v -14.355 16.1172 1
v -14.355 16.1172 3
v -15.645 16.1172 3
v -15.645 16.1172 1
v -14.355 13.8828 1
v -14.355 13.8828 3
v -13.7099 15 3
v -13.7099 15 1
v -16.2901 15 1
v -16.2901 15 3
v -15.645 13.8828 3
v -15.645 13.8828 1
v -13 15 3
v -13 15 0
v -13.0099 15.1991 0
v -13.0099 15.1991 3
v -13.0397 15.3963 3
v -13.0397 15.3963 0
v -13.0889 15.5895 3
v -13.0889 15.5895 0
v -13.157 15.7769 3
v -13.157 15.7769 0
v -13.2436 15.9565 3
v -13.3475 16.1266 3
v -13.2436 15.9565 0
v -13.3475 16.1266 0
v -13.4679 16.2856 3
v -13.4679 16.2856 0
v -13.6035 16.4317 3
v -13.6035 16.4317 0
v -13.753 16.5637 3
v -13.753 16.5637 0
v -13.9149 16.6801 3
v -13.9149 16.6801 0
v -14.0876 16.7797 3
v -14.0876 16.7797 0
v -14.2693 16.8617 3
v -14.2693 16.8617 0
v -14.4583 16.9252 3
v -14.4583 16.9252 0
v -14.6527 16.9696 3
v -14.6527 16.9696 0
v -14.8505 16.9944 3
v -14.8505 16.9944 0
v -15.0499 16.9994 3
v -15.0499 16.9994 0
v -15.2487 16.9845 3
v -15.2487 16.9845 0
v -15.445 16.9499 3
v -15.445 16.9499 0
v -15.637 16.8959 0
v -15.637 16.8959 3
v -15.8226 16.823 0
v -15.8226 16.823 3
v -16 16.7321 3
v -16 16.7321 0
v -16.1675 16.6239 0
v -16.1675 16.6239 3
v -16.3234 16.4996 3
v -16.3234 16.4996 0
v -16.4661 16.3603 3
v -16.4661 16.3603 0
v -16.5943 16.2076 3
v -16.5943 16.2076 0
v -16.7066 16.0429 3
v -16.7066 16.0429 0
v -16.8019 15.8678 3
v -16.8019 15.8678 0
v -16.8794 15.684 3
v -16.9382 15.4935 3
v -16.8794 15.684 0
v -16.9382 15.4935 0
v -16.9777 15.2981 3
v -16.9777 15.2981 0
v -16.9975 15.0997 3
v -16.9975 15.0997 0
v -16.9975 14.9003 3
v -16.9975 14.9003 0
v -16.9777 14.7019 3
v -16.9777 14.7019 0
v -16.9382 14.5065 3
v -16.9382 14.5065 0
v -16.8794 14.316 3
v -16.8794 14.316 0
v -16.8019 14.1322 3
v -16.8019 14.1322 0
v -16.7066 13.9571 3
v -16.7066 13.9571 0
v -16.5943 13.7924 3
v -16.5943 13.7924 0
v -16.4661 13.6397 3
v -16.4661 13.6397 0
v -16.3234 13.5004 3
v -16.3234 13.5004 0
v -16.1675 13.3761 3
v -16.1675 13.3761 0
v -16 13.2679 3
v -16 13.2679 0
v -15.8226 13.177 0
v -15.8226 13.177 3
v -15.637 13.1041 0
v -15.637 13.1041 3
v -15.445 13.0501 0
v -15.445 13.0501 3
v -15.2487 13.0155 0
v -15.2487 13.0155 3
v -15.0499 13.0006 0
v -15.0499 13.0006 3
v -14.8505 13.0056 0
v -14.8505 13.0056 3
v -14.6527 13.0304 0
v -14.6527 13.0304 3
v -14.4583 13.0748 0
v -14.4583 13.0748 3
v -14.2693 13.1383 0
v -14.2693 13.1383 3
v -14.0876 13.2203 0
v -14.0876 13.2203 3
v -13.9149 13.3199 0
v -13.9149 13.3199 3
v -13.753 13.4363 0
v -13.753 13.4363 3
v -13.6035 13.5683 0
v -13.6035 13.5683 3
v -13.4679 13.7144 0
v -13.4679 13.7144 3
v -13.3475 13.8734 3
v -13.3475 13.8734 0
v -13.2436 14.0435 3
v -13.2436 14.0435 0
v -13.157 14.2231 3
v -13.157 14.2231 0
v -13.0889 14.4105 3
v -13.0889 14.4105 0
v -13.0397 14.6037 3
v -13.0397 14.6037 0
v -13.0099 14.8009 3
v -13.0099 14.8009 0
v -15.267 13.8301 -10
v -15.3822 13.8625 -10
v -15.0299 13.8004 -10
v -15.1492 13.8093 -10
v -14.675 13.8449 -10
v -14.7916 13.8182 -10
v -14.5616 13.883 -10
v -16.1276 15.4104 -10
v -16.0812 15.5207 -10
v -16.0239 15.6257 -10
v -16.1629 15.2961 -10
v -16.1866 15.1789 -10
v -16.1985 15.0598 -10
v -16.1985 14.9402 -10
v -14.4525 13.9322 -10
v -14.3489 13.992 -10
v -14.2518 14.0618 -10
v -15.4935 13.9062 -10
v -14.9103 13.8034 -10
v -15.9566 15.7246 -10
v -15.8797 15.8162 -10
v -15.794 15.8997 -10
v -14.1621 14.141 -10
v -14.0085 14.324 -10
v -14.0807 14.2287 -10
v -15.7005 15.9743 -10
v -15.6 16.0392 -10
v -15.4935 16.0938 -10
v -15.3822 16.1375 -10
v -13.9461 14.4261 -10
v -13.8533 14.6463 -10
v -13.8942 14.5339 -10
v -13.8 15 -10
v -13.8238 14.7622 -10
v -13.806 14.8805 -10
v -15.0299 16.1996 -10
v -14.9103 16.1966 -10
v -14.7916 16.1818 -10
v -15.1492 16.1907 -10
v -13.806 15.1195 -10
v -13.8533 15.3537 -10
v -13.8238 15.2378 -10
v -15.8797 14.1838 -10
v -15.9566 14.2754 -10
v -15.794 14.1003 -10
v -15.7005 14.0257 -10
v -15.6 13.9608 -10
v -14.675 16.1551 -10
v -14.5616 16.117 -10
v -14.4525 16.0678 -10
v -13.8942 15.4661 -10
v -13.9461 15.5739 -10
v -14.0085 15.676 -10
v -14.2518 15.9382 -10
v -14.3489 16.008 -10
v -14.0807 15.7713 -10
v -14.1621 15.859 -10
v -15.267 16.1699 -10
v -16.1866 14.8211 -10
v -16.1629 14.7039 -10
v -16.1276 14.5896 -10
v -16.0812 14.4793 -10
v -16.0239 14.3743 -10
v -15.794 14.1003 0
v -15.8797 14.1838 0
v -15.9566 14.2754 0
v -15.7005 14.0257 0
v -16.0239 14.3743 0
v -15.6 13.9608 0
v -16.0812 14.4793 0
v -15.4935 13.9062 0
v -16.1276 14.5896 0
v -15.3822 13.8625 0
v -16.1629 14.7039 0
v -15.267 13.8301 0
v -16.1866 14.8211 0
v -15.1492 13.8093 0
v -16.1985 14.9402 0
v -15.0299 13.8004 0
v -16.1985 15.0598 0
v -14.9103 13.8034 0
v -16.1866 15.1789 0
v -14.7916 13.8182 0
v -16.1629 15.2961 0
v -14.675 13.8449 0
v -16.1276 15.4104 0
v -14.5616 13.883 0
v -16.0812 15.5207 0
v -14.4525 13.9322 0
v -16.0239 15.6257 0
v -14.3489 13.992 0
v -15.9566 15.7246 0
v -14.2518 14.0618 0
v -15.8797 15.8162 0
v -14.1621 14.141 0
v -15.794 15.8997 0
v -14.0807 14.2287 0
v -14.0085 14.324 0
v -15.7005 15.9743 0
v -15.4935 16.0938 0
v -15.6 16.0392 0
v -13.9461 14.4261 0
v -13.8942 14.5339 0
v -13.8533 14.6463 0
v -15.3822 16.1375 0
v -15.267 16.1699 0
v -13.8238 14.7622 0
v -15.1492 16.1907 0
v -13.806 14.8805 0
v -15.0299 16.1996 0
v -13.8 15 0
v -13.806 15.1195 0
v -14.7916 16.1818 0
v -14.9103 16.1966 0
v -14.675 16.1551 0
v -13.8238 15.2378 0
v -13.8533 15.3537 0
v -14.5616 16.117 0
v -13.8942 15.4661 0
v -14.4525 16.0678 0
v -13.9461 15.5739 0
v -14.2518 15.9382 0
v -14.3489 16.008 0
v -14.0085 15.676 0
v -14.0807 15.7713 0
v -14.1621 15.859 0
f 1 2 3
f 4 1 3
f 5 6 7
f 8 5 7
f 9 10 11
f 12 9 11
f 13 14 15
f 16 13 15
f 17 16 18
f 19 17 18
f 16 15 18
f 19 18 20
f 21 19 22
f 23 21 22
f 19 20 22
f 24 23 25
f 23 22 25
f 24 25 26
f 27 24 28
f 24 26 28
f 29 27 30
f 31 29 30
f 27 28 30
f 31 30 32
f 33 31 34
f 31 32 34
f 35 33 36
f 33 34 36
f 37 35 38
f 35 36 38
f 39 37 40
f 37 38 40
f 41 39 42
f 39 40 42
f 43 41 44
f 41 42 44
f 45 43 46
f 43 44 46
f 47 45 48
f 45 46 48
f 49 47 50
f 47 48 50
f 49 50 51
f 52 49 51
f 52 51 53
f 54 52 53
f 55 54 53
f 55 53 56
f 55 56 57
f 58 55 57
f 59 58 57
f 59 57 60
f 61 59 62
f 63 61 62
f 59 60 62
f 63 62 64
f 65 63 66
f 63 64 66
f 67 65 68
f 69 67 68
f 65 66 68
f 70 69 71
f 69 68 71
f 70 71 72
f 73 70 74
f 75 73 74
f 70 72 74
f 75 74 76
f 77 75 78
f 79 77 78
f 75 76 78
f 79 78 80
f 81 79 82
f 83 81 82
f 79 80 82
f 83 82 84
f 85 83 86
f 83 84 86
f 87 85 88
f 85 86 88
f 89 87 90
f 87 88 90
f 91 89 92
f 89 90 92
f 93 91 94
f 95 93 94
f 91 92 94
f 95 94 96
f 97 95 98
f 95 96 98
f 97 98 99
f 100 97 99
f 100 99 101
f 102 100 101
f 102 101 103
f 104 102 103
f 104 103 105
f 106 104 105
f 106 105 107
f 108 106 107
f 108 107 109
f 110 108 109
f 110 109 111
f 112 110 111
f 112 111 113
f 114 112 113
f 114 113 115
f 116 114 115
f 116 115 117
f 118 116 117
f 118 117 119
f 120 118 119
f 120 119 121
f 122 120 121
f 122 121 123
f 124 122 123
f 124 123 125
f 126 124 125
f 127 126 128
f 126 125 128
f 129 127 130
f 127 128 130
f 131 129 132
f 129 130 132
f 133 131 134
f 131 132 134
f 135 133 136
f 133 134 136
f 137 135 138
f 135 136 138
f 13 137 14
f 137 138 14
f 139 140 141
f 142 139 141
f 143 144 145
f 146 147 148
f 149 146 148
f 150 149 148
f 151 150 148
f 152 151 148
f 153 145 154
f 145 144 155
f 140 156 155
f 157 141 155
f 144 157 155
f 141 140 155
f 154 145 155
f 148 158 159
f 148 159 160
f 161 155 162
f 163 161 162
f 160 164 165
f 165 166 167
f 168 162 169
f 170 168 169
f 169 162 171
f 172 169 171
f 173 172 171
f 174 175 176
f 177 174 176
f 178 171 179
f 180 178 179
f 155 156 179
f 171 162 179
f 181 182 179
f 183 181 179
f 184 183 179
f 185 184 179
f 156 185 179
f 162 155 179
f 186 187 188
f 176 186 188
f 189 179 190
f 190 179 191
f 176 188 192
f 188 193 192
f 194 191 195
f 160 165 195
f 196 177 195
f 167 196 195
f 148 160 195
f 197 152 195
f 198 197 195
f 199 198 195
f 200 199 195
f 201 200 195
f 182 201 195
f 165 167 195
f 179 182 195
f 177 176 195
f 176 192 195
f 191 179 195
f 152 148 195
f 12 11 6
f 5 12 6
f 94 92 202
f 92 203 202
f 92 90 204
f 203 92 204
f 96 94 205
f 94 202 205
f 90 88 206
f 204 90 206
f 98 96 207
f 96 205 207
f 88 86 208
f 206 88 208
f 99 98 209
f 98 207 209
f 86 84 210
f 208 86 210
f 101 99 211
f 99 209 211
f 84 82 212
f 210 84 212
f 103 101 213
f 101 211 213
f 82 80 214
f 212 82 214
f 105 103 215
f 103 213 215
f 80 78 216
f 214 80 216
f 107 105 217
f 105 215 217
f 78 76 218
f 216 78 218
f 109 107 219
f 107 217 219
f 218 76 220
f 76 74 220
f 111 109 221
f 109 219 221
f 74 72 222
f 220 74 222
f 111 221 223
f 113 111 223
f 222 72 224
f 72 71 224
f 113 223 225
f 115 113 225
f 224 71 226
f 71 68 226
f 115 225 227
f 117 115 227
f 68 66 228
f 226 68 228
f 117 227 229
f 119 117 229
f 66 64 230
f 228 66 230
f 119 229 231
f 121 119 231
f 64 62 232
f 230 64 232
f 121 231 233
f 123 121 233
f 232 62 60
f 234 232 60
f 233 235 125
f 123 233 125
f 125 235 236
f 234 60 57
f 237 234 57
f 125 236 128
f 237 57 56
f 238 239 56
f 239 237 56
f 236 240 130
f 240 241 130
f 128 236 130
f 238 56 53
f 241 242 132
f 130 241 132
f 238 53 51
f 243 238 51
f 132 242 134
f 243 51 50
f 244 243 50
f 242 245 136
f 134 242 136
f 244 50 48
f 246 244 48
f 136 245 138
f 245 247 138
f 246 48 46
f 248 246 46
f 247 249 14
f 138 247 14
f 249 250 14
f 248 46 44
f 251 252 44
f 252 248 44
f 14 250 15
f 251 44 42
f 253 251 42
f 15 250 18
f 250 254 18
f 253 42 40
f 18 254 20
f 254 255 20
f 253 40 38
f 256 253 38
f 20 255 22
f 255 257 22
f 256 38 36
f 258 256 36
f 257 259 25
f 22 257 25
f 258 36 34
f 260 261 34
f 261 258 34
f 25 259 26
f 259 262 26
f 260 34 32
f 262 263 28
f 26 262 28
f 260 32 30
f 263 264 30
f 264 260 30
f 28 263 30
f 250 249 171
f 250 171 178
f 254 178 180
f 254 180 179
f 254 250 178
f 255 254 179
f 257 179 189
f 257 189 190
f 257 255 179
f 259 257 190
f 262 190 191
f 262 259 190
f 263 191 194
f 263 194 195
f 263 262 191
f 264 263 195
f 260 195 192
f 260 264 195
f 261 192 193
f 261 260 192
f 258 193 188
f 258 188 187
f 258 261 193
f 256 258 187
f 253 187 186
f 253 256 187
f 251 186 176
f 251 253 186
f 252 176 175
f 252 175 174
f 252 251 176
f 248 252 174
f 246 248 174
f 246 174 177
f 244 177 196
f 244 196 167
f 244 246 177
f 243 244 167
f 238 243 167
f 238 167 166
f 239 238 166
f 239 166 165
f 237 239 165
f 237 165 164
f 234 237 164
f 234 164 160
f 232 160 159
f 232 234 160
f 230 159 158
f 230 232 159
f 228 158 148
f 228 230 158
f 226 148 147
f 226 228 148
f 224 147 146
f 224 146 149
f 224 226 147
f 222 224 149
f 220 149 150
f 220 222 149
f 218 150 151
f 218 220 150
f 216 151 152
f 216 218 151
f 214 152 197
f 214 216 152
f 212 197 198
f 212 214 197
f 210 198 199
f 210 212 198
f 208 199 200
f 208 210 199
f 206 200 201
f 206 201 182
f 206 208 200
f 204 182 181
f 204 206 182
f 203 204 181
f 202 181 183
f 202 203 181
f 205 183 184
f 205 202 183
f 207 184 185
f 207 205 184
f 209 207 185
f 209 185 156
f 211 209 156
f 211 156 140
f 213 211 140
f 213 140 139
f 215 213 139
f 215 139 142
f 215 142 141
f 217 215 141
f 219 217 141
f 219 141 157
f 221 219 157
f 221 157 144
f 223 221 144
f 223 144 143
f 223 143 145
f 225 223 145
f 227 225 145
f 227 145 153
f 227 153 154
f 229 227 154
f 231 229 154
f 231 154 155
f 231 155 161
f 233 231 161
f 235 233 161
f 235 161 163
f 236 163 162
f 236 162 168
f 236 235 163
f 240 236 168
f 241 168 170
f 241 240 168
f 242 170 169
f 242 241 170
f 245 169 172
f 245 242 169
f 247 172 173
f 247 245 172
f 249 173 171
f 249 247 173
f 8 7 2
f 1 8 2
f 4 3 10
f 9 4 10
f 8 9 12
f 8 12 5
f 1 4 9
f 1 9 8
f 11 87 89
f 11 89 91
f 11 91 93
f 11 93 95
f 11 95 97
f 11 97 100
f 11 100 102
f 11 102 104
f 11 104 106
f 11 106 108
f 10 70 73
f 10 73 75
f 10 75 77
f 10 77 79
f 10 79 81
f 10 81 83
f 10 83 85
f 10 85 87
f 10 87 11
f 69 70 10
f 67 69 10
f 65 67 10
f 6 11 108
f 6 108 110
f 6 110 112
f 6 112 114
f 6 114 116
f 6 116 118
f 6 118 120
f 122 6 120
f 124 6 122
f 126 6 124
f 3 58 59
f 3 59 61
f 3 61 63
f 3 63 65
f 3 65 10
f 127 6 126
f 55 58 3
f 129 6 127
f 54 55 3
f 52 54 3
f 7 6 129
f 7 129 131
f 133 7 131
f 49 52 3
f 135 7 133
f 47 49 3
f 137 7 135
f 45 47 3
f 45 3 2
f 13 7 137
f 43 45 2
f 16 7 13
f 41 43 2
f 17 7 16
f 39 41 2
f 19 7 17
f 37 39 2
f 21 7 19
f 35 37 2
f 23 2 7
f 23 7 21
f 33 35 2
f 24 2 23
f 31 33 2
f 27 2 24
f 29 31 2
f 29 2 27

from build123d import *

# Parameters (mm, degrees)
SKETCH1_R           = 1.2
BOSS_EXTRUDE1_DEPTH = 10
SKETCH2_R           = 2
BOSS_EXTRUDE2_DEPTH = 3
CUT_EXTRUDE1_DEPTH  = 2


with BuildPart() as part:
    # Sketch1 → Boss-Extrude1 (new body)
    with BuildSketch(Plane.XY):
        with Locations((-15, 15)):
            Circle(SKETCH1_R)
    extrude(amount=-BOSS_EXTRUDE1_DEPTH)

    # Sketch2 → Boss-Extrude2 (add)
    with BuildSketch(Plane.XY):
        with Locations((-15, 15)):
            Circle(SKETCH2_R)
    extrude(amount=BOSS_EXTRUDE2_DEPTH)

    # Sketch3 → Cut-Extrude1 (cut)
    with BuildSketch(Plane.XY.offset(3)):
        Polygon((-13.709947687, 15), (-14.354973843, 16.117218076), (-15.645026157, 16.117218076), (-16.290052313, 15), (-15.645026157, 13.882781924), (-14.354973843, 13.882781924), align=None)
    extrude(amount=-CUT_EXTRUDE1_DEPTH, mode=Mode.SUBTRACT)


solid = part.part
